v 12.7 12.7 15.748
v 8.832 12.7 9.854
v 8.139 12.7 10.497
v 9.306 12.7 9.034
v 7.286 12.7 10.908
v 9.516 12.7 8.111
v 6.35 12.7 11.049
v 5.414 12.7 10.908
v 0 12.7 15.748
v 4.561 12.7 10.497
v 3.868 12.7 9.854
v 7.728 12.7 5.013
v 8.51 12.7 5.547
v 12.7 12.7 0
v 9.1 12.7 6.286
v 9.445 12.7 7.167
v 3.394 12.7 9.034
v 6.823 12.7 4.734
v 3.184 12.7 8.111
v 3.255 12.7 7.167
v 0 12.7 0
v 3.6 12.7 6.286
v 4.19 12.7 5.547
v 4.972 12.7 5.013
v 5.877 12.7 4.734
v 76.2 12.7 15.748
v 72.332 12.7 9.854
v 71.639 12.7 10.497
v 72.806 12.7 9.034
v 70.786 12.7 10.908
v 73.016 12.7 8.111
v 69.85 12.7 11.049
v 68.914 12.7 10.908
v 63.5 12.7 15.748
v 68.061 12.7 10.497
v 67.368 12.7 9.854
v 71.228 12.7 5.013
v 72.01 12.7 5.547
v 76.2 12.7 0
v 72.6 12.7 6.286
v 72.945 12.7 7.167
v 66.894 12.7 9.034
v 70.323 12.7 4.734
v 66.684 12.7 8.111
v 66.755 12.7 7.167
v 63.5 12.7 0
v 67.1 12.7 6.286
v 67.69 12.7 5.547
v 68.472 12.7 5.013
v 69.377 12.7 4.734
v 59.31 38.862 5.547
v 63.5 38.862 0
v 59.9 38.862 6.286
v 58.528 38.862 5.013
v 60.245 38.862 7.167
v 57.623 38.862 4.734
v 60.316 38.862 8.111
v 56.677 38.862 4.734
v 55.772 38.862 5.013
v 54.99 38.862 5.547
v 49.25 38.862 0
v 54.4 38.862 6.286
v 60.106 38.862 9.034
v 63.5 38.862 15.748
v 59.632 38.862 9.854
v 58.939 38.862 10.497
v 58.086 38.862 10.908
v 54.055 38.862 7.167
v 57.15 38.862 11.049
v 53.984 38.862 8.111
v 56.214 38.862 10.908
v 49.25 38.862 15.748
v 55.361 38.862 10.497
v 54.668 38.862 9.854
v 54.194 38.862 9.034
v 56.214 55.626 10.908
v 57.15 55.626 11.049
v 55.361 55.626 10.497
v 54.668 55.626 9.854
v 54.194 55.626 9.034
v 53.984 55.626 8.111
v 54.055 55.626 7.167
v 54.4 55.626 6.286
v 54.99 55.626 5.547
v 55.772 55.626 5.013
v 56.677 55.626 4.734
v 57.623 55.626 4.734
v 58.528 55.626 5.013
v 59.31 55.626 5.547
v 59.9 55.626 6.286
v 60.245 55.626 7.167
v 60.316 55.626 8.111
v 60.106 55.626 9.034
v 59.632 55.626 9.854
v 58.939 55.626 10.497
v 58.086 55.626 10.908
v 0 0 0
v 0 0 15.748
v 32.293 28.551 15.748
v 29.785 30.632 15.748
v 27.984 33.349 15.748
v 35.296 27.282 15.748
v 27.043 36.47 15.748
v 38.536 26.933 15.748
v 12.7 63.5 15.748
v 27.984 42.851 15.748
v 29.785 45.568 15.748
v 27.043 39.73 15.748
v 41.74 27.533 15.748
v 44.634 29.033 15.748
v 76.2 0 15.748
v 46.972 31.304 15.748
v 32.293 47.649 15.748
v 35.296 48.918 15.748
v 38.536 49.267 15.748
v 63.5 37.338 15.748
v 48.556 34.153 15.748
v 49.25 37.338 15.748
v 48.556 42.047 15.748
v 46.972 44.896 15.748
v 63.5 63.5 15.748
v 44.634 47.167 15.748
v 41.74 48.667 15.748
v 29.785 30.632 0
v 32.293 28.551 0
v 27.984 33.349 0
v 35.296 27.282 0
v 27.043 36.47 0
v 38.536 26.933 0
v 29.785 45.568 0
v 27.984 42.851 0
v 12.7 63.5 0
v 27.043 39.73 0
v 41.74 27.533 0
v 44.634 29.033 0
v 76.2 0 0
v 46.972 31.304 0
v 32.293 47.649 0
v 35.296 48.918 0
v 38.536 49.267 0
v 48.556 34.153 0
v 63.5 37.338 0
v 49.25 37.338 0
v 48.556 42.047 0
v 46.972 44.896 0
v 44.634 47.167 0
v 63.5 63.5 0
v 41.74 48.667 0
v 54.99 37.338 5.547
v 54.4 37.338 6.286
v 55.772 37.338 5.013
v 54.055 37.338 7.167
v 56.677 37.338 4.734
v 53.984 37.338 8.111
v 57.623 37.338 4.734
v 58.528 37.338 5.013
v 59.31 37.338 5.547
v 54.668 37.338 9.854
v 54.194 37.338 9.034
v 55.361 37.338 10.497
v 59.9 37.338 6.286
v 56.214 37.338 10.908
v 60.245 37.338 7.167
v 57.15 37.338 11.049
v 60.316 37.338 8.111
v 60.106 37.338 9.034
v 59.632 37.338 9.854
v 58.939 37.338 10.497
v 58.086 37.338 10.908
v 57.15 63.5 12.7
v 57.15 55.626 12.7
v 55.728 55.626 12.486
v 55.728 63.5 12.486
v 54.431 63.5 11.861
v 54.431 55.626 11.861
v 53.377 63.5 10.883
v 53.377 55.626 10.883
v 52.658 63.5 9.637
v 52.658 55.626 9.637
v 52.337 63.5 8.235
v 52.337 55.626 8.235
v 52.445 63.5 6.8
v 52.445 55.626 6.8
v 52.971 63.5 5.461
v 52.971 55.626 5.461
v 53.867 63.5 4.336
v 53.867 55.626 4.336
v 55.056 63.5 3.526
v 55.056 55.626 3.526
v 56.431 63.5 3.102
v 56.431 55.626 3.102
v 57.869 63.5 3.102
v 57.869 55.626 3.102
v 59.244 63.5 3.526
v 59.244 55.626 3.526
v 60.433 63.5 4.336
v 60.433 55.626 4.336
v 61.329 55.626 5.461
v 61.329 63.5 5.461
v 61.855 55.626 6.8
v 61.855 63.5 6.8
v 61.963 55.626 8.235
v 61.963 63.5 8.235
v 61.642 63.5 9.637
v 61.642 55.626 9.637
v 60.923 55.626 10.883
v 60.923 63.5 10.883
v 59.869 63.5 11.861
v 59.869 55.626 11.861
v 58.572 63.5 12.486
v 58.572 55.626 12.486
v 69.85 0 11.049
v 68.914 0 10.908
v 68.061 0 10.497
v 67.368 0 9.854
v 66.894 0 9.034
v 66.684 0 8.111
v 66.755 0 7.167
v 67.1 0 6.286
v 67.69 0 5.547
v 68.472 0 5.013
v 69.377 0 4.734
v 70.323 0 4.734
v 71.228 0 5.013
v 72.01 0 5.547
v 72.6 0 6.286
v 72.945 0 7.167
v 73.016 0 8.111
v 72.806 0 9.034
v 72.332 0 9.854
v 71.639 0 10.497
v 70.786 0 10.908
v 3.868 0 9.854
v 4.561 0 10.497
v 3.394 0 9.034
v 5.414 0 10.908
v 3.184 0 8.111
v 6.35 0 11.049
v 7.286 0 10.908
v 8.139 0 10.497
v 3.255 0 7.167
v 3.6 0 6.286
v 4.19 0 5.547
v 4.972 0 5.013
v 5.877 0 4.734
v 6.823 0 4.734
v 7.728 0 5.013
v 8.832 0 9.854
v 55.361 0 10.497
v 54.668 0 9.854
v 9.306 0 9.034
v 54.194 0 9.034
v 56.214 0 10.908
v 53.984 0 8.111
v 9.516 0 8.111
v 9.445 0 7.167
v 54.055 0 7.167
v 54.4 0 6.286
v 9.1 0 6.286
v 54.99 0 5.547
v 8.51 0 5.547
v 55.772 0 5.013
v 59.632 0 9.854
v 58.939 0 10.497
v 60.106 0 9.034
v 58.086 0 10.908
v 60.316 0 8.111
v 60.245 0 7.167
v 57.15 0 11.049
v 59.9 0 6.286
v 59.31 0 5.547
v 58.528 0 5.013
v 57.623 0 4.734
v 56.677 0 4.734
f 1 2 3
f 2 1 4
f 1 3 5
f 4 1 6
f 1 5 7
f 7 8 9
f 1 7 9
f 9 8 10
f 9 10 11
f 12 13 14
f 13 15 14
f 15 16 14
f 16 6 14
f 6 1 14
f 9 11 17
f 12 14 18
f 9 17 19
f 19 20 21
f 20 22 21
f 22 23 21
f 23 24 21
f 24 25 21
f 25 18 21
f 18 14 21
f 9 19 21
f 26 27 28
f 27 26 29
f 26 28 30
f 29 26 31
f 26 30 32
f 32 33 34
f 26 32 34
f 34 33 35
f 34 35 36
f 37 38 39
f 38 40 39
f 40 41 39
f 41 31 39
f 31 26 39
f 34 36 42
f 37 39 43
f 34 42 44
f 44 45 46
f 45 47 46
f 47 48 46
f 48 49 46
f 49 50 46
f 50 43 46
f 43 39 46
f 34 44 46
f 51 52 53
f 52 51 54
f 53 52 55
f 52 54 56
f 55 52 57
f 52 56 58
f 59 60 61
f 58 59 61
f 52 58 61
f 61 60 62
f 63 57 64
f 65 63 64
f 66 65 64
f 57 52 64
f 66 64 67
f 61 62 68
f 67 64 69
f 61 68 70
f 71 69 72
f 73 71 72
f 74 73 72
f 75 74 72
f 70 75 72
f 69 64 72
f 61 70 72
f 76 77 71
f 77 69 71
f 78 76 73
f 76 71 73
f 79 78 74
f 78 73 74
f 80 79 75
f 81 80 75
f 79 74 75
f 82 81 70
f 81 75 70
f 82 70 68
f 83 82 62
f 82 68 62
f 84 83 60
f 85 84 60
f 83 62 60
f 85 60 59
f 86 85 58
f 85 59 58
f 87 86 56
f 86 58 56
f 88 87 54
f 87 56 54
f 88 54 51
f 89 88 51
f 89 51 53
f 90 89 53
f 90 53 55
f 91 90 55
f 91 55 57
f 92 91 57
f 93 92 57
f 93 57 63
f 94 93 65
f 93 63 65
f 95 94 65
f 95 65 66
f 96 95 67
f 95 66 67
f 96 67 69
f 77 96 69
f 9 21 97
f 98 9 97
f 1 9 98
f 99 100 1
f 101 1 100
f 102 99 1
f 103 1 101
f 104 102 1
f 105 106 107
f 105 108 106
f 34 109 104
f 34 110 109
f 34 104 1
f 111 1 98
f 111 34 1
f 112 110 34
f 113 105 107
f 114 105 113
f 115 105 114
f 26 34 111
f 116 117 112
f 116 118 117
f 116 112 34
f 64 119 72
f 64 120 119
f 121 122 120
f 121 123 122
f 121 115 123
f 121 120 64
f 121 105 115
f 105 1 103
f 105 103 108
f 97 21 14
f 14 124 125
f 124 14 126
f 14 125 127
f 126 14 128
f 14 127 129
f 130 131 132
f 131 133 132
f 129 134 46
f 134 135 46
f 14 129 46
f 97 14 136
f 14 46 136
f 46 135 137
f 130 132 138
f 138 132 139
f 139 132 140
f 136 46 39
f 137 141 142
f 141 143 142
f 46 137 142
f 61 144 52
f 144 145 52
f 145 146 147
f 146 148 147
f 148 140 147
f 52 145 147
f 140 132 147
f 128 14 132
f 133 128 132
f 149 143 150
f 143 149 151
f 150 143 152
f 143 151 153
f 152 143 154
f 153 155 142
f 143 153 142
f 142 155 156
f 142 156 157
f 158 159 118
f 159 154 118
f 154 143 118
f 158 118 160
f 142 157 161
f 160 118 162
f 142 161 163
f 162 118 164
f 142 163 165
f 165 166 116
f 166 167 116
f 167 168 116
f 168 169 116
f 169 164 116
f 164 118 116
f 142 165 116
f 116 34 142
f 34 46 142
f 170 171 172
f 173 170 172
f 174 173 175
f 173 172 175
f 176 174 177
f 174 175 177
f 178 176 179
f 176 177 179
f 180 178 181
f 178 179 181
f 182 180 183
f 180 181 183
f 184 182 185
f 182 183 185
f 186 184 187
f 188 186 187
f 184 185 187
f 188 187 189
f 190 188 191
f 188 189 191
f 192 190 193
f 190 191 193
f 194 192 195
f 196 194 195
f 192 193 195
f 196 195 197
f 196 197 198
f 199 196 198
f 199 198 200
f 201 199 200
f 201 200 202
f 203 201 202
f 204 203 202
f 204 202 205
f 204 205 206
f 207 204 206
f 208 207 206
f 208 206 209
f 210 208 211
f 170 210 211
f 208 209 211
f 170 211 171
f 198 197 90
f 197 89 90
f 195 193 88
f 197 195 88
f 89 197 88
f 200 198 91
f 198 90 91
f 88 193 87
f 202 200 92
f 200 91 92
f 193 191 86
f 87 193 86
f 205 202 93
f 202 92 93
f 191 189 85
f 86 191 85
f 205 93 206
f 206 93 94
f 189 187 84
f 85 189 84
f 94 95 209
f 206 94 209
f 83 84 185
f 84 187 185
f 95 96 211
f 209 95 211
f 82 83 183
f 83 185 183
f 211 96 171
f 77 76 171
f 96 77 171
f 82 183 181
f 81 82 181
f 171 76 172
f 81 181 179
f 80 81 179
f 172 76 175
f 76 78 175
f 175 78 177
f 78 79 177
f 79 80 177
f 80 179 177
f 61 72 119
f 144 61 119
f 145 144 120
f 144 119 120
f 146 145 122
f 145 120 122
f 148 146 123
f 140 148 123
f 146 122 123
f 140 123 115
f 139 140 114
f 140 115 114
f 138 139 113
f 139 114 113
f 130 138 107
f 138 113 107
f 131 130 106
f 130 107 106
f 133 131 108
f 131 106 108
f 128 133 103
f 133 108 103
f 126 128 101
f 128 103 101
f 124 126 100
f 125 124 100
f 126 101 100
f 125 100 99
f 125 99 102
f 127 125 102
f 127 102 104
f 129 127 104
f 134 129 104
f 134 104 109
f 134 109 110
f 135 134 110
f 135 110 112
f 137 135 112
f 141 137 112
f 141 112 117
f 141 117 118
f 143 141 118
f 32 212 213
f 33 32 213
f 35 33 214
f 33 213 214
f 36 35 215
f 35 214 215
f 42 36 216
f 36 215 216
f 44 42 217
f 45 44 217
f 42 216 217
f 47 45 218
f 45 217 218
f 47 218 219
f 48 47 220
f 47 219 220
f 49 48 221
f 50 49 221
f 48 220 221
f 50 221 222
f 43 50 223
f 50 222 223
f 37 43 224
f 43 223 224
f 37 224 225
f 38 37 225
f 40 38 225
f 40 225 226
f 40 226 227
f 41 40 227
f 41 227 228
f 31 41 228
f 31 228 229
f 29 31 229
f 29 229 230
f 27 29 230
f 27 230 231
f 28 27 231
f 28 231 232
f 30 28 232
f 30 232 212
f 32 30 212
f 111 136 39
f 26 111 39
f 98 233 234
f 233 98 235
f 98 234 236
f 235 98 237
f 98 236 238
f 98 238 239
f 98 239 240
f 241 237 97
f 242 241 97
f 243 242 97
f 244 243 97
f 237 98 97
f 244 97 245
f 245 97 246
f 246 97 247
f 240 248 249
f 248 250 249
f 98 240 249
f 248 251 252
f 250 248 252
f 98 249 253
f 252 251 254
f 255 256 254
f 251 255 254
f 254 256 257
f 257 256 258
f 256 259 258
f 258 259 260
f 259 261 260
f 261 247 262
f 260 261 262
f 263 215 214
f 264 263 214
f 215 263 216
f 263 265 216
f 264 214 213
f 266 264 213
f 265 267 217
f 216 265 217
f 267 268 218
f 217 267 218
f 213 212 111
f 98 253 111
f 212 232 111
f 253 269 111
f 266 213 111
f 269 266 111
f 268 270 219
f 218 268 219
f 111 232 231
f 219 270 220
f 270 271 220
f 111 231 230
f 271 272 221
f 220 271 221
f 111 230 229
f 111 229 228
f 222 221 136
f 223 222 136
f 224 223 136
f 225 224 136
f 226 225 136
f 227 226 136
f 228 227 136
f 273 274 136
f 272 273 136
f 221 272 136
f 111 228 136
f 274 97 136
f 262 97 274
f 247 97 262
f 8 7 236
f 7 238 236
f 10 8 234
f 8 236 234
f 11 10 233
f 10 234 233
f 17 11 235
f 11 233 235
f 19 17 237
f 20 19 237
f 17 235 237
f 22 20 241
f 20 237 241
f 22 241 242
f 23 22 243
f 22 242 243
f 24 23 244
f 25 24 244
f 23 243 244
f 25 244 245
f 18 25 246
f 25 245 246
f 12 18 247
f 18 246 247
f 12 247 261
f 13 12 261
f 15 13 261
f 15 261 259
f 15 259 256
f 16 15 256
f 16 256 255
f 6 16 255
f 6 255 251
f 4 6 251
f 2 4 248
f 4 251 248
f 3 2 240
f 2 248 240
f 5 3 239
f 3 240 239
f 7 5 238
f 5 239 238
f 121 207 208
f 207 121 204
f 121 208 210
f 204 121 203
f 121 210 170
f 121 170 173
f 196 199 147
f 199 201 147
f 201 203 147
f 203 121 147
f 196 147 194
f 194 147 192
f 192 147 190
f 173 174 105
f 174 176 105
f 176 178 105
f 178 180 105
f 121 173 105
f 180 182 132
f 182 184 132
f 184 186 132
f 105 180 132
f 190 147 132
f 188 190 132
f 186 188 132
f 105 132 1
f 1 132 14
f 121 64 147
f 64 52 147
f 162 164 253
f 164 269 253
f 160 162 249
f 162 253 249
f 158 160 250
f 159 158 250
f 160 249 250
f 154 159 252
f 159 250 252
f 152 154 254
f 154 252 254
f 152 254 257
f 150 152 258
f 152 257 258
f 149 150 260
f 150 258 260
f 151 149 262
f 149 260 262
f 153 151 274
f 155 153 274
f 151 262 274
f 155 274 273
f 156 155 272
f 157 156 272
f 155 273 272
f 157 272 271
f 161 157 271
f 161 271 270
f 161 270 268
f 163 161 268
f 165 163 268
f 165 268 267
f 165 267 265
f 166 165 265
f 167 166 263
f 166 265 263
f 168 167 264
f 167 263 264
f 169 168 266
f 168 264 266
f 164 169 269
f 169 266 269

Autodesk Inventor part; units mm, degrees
ref_plane "YZ Plane" through (0, 0, 0) normal (1, 0, 0) x (0, 1, 0)
ref_plane "XZ Plane" through (0, 0, 0) normal (0, 1, 0) x (-1, 0, 0)
ref_plane "XY Plane" through (0, 0, 0) normal (0, 0, 1) x (1, 0, 0)
sketch "Sketch1" plane through (0, 0, 0) normal (0, 0, 1) x (1, 0, 0)
  line L0 (0, 0) -> (76.2, 0)
  line L1 (76.2, 0) -> (76.2, 12.7)
  line L2 (76.2, 12.7) -> (63.5, 12.7)
  line L3 (63.5, 12.7) -> (63.5, 63.5)
  line L4 (63.5, 63.5) -> (12.7, 63.5)
  line L5 (12.7, 63.5) -> (12.7, 12.7)
  line L6 (12.7, 12.7) -> (0, 12.7)
  line L7 (0, 12.7) -> (0, 0)
  dimension "d0" = 12.7
  dimension "d1" = 12.7
  dimension "d2" = 76.2
  dimension "d3" = 50.8
  dimension "d4" = 12.7
extrude "Extrusion1" add sketch "Sketch1" along normal blind 15.748
sketch "Sketch2" plane through (0, 0, 15.748) normal (0, 0, 1) x (1, 0, 0)
  arc A0 (49.25, 38.862) -> (49.25, 37.338) centre (38.1, 38.1) ccw
  line L0 (12.7, 63.5) -> (12.7, 12.7) projected
  line L1 (63.5, 63.5) -> (12.7, 63.5) projected
  line L2 (63.5, 38.862) -> (49.25, 38.862)
  line L3 (49.25, 37.338) -> (63.5, 37.338)
  line L4 (63.5, 12.7) -> (63.5, 63.5) projected
  line L5 (63.5, 38.862) -> (63.5, 37.338)
  point P0 (0, 0)
  dimension "d7" = 22.352
  dimension "d8" = 25.4
  dimension "d9" = 25.4
  dimension "d10" = 1.524
  dimension "d11" = 24.638
extrude "Extrusion2" cut sketch "Sketch2" against normal blind 15.748
sketch "Sketch3" plane through (63.5, 12.7, 0) normal (0, 1, 0) x (1, 0, 0)
  line L0 (-50.8, -15.748) -> (-63.5, -15.748) projected
  line L1 (-63.5, 0) -> (-63.5, -15.748) projected
  line L2 (12.7, 0) -> (12.7, -15.748) projected
  line L3 (12.7, -15.748) -> (0, -15.748) projected
  point P0 (-57.15, -7.874)
  point P1 (6.35, -7.874)
  dimension "d14" = 7.874
  dimension "d15" = 6.35
  dimension "d16" = 6.35
  dimension "d17" = 7.874
hole "Hole1" at (6.35, 12.7, 7.874) at (69.85, 12.7, 7.874) direction (0, -1, 0) diameter 6.35 end through all
sketch "Sketch4" plane through (12.7, 63.5, 0) normal (0, 1, 0) x (1, 0, 0)
  line L0 (50.8, 0) -> (0, 0) projected
  line L1 (50.8, 0) -> (50.8, -15.748) projected
  point P0 (-12.7, 0)
  point P1 (44.45, -7.874)
  dimension "d25" = 7.874
  dimension "d26" = 6.35
hole "Hole2" at (57.15, 63.5, 7.874) direction (0, -1, 0) diameter 6.35 end through all counterbore diameter 9.652 counterbore depth 7.874
properties part number "Figure 6_16_W"
